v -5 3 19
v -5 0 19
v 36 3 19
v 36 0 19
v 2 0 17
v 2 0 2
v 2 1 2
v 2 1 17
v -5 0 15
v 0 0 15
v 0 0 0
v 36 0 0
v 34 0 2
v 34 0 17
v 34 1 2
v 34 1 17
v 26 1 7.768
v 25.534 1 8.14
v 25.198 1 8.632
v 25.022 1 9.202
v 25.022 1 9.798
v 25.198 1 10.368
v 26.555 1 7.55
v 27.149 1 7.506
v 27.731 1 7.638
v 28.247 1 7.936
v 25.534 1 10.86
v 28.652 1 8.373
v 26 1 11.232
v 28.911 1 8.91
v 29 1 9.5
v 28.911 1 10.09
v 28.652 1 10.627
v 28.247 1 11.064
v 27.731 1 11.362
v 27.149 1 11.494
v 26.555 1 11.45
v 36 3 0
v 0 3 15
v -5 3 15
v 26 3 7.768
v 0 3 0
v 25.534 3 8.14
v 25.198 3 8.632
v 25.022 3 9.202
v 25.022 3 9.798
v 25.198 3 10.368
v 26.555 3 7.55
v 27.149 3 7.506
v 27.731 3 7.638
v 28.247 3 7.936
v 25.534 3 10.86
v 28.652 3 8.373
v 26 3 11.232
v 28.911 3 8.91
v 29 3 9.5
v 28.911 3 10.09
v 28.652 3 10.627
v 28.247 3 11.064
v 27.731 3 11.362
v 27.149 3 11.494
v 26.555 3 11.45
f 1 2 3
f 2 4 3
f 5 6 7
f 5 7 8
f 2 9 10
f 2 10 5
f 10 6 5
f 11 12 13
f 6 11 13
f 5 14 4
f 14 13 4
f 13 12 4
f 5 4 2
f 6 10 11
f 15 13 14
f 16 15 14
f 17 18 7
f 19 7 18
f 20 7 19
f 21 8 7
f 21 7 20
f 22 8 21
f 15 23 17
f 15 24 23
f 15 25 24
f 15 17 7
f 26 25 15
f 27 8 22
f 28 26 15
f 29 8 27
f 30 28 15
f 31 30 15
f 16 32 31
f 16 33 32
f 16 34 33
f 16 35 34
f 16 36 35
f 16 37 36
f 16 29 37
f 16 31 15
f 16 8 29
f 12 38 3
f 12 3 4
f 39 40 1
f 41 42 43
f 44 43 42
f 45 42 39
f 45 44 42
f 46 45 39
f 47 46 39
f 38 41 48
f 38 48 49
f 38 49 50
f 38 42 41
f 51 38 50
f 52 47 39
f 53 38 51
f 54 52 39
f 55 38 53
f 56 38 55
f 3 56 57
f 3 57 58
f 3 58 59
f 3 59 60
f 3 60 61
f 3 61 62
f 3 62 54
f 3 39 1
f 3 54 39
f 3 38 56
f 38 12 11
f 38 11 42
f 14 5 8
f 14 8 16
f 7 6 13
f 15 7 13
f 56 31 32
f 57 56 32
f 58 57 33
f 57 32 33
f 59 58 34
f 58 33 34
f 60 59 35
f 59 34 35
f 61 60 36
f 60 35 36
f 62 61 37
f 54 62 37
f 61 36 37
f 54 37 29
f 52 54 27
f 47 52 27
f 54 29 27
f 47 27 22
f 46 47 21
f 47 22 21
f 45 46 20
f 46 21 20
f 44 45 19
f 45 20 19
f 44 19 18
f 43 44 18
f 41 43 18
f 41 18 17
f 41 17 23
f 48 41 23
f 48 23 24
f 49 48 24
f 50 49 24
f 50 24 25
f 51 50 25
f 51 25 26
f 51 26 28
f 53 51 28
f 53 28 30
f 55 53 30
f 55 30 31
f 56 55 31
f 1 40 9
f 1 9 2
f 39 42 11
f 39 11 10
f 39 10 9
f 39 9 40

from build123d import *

# Parameters (mm, degrees)
P_IDAT_VYSUNUT_M1_DEPTH  = 19
SKICA2_W                 = 4
SKICA2_H                 = 4
ODEBRAT_VYSUNUT_M1_DEPTH = 15
SKICA3_W                 = 32
SKICA3_H                 = 15
ODEBRAT_VYSUNUT_M2_DEPTH = 1
SKICA4_W                 = 4
SKICA4_H                 = 4
ODEBRAT_VYSUNUT_M3_DEPTH = 50
SKICA5_W                 = 4
SKICA5_H                 = 3
P_IDAT_VYSUNUT_M2_DEPTH  = 5
SKICA6_R                 = 2
ODEBRAT_VYSUNUT_M4_DEPTH = 5
SKICA8_W                 = 4
SKICA8_H                 = 3
ODEBRAT_VYSUNUT_M6_DEPTH = 5
SKICA9_W                 = 4
SKICA9_H                 = 3
P_IDAT_VYSUNUT_M3_DEPTH  = 5


with BuildPart() as part:
    # Skica1 → Přidat vysunutím1 (new body)
    with BuildSketch(Plane.XY):
        Polygon((0, 0), (0, 7), (4, 7), (4, 3), (36, 3), (36, 0), align=None)
    extrude(amount=P_IDAT_VYSUNUT_M1_DEPTH)

    # Skica2 → Odebrat vysunutím1 (cut)
    with BuildSketch(Plane.XY.offset(19)):
        with Locations((2, 5)):
            Rectangle(SKICA2_W, SKICA2_H)
    extrude(amount=-ODEBRAT_VYSUNUT_M1_DEPTH, mode=Mode.SUBTRACT)

    # Skica3 → Odebrat vysunutím2 (cut)
    with BuildSketch(Plane.XZ):
        with Locations((18, 9.5)):
            Rectangle(SKICA3_W, SKICA3_H)
    extrude(amount=-ODEBRAT_VYSUNUT_M2_DEPTH, mode=Mode.SUBTRACT)

    # Skica4 → Odebrat vysunutím3 (cut)
    with BuildSketch(Plane.ZY):
        with Locations((2, 5)):
            Rectangle(SKICA4_W, SKICA4_H)
    extrude(amount=-ODEBRAT_VYSUNUT_M3_DEPTH, mode=Mode.SUBTRACT)

    # Skica5 → Přidat vysunutím2 (add)
    with BuildSketch(Plane.ZY):
        with Locations((2, 1.5)):
            Rectangle(SKICA5_W, SKICA5_H)
    extrude(amount=P_IDAT_VYSUNUT_M2_DEPTH)

    # Skica6 → Odebrat vysunutím4 (cut)
    with BuildSketch(Plane.XZ.offset(-1)):
        with Locations((27, 9.5)):
            Circle(SKICA6_R)
    extrude(amount=-ODEBRAT_VYSUNUT_M4_DEPTH, mode=Mode.SUBTRACT)

    # Skica8 → Odebrat vysunutím6 (cut)
    with BuildSketch(Plane.ZY.offset(5)):
        with Locations((2, 1.5)):
            Rectangle(SKICA8_W, SKICA8_H)
    extrude(amount=-ODEBRAT_VYSUNUT_M6_DEPTH, mode=Mode.SUBTRACT)

    # Skica9 → Přidat vysunutím3 (add)
    with BuildSketch(Plane.ZY):
        with Locations((17, 1.5)):
            Rectangle(SKICA9_W, SKICA9_H)
    extrude(amount=P_IDAT_VYSUNUT_M3_DEPTH)


solid = part.part
